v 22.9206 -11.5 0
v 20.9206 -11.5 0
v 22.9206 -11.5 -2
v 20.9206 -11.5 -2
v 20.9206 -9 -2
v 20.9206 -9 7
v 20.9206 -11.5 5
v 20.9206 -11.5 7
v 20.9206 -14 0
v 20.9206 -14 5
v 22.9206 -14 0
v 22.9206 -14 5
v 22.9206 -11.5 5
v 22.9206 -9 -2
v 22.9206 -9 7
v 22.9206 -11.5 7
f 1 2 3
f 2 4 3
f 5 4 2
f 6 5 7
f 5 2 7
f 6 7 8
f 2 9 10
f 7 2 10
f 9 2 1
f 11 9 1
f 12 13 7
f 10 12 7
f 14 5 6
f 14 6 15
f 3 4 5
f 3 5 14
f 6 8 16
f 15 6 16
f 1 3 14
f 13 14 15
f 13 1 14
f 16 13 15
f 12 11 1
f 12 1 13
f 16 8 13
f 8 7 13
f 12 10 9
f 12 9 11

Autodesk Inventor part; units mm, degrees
ref_plane "YZ Plane" through (0, 0, 0) normal (1, 0, 0) x (0, 1, 0)
ref_plane "XZ Plane" through (0, 0, 0) normal (0, 1, 0) x (-1, 0, 0)
ref_plane "XY Plane" through (0, 0, 0) normal (0, 0, 1) x (1, 0, 0)
ref_plane "Work Plane1" through (2.9206, -11.5, 0) normal (0, 1, 0) x (1, 0, 0)
sketch "Sketch1" plane through (2.9206, -11.5, 0) normal (0, 1, 0) x (1, 0, 0)
  line L0 (0, 0) -> (30, 0) projected
  line L1 (30, 0) -> (30, 2) projected
  line L2 (20, 2) -> (30, 2) projected
  line L3 (20, 2) -> (20, 4) projected
  line L4 (18, 4) -> (20, 4) projected
  line L5 (18, 2) -> (18, 4) projected
  line L6 (15, 2) -> (18, 2) projected
  line L7 (15, 2) -> (15, 4) projected
  line L8 (13, 4) -> (15, 4) projected
  line L9 (13, 2) -> (13, 4) projected
  line L10 (0, 2) -> (13, 2) projected
  line L11 (0, 0) -> (0, 2) projected
  line L12 (18, 2) -> (18, 0)
  line L13 (18, 2) -> (20, 2)
  line L14 (20, 2) -> (20, 0)
  line L15 (18, 0) -> (20, 0)
  line L16 (18, 0) -> (18, -5)
  line L17 (18, -5) -> (20, -5)
  line L18 (20, -5) -> (20, 0)
  line L19 (18, -5) -> (18, -7)
  line L20 (18, -7) -> (20, -7)
  line L21 (20, -7) -> (20, -5)
  point P0 (-2.9206, 0)
  dimension "d7" = 5
  dimension "d8" = 2
ref_plane "Work Plane2" through (2.9206, -11.5, 0) normal (0, -1, 0) x (1, 0, 0)
extrude "Extrusion3" add sketch "Sketch1" along normal blind 2.5 contours L12 L13 L14 L0 | L0 L18 L17 L16 | L17 L21 L20 L19
sketch "Sketch3" plane through (2.9206, -11.5, 0) normal (0, -1, 0) x (1, 0, 0)
  line L0 (20, 7) -> (20, -2) projected
  line L1 (2, 0) -> (28, 0) projected
  line L2 (20, 0) -> (20, 5)
  line L3 (20, 7) -> (20, -2) projected
  line L4 (20, 5) -> (18, 5)
  line L5 (18, -2) -> (18, 7) projected
  line L6 (18, 5) -> (18, 0)
  line L7 (20, 0) -> (18, 0)
  point P0 (-2.9206, 0)
  dimension "d11" = 5
extrude "Extrusion4" add sketch "Sketch3" along normal blind 2.5
properties part number "spacer_"
